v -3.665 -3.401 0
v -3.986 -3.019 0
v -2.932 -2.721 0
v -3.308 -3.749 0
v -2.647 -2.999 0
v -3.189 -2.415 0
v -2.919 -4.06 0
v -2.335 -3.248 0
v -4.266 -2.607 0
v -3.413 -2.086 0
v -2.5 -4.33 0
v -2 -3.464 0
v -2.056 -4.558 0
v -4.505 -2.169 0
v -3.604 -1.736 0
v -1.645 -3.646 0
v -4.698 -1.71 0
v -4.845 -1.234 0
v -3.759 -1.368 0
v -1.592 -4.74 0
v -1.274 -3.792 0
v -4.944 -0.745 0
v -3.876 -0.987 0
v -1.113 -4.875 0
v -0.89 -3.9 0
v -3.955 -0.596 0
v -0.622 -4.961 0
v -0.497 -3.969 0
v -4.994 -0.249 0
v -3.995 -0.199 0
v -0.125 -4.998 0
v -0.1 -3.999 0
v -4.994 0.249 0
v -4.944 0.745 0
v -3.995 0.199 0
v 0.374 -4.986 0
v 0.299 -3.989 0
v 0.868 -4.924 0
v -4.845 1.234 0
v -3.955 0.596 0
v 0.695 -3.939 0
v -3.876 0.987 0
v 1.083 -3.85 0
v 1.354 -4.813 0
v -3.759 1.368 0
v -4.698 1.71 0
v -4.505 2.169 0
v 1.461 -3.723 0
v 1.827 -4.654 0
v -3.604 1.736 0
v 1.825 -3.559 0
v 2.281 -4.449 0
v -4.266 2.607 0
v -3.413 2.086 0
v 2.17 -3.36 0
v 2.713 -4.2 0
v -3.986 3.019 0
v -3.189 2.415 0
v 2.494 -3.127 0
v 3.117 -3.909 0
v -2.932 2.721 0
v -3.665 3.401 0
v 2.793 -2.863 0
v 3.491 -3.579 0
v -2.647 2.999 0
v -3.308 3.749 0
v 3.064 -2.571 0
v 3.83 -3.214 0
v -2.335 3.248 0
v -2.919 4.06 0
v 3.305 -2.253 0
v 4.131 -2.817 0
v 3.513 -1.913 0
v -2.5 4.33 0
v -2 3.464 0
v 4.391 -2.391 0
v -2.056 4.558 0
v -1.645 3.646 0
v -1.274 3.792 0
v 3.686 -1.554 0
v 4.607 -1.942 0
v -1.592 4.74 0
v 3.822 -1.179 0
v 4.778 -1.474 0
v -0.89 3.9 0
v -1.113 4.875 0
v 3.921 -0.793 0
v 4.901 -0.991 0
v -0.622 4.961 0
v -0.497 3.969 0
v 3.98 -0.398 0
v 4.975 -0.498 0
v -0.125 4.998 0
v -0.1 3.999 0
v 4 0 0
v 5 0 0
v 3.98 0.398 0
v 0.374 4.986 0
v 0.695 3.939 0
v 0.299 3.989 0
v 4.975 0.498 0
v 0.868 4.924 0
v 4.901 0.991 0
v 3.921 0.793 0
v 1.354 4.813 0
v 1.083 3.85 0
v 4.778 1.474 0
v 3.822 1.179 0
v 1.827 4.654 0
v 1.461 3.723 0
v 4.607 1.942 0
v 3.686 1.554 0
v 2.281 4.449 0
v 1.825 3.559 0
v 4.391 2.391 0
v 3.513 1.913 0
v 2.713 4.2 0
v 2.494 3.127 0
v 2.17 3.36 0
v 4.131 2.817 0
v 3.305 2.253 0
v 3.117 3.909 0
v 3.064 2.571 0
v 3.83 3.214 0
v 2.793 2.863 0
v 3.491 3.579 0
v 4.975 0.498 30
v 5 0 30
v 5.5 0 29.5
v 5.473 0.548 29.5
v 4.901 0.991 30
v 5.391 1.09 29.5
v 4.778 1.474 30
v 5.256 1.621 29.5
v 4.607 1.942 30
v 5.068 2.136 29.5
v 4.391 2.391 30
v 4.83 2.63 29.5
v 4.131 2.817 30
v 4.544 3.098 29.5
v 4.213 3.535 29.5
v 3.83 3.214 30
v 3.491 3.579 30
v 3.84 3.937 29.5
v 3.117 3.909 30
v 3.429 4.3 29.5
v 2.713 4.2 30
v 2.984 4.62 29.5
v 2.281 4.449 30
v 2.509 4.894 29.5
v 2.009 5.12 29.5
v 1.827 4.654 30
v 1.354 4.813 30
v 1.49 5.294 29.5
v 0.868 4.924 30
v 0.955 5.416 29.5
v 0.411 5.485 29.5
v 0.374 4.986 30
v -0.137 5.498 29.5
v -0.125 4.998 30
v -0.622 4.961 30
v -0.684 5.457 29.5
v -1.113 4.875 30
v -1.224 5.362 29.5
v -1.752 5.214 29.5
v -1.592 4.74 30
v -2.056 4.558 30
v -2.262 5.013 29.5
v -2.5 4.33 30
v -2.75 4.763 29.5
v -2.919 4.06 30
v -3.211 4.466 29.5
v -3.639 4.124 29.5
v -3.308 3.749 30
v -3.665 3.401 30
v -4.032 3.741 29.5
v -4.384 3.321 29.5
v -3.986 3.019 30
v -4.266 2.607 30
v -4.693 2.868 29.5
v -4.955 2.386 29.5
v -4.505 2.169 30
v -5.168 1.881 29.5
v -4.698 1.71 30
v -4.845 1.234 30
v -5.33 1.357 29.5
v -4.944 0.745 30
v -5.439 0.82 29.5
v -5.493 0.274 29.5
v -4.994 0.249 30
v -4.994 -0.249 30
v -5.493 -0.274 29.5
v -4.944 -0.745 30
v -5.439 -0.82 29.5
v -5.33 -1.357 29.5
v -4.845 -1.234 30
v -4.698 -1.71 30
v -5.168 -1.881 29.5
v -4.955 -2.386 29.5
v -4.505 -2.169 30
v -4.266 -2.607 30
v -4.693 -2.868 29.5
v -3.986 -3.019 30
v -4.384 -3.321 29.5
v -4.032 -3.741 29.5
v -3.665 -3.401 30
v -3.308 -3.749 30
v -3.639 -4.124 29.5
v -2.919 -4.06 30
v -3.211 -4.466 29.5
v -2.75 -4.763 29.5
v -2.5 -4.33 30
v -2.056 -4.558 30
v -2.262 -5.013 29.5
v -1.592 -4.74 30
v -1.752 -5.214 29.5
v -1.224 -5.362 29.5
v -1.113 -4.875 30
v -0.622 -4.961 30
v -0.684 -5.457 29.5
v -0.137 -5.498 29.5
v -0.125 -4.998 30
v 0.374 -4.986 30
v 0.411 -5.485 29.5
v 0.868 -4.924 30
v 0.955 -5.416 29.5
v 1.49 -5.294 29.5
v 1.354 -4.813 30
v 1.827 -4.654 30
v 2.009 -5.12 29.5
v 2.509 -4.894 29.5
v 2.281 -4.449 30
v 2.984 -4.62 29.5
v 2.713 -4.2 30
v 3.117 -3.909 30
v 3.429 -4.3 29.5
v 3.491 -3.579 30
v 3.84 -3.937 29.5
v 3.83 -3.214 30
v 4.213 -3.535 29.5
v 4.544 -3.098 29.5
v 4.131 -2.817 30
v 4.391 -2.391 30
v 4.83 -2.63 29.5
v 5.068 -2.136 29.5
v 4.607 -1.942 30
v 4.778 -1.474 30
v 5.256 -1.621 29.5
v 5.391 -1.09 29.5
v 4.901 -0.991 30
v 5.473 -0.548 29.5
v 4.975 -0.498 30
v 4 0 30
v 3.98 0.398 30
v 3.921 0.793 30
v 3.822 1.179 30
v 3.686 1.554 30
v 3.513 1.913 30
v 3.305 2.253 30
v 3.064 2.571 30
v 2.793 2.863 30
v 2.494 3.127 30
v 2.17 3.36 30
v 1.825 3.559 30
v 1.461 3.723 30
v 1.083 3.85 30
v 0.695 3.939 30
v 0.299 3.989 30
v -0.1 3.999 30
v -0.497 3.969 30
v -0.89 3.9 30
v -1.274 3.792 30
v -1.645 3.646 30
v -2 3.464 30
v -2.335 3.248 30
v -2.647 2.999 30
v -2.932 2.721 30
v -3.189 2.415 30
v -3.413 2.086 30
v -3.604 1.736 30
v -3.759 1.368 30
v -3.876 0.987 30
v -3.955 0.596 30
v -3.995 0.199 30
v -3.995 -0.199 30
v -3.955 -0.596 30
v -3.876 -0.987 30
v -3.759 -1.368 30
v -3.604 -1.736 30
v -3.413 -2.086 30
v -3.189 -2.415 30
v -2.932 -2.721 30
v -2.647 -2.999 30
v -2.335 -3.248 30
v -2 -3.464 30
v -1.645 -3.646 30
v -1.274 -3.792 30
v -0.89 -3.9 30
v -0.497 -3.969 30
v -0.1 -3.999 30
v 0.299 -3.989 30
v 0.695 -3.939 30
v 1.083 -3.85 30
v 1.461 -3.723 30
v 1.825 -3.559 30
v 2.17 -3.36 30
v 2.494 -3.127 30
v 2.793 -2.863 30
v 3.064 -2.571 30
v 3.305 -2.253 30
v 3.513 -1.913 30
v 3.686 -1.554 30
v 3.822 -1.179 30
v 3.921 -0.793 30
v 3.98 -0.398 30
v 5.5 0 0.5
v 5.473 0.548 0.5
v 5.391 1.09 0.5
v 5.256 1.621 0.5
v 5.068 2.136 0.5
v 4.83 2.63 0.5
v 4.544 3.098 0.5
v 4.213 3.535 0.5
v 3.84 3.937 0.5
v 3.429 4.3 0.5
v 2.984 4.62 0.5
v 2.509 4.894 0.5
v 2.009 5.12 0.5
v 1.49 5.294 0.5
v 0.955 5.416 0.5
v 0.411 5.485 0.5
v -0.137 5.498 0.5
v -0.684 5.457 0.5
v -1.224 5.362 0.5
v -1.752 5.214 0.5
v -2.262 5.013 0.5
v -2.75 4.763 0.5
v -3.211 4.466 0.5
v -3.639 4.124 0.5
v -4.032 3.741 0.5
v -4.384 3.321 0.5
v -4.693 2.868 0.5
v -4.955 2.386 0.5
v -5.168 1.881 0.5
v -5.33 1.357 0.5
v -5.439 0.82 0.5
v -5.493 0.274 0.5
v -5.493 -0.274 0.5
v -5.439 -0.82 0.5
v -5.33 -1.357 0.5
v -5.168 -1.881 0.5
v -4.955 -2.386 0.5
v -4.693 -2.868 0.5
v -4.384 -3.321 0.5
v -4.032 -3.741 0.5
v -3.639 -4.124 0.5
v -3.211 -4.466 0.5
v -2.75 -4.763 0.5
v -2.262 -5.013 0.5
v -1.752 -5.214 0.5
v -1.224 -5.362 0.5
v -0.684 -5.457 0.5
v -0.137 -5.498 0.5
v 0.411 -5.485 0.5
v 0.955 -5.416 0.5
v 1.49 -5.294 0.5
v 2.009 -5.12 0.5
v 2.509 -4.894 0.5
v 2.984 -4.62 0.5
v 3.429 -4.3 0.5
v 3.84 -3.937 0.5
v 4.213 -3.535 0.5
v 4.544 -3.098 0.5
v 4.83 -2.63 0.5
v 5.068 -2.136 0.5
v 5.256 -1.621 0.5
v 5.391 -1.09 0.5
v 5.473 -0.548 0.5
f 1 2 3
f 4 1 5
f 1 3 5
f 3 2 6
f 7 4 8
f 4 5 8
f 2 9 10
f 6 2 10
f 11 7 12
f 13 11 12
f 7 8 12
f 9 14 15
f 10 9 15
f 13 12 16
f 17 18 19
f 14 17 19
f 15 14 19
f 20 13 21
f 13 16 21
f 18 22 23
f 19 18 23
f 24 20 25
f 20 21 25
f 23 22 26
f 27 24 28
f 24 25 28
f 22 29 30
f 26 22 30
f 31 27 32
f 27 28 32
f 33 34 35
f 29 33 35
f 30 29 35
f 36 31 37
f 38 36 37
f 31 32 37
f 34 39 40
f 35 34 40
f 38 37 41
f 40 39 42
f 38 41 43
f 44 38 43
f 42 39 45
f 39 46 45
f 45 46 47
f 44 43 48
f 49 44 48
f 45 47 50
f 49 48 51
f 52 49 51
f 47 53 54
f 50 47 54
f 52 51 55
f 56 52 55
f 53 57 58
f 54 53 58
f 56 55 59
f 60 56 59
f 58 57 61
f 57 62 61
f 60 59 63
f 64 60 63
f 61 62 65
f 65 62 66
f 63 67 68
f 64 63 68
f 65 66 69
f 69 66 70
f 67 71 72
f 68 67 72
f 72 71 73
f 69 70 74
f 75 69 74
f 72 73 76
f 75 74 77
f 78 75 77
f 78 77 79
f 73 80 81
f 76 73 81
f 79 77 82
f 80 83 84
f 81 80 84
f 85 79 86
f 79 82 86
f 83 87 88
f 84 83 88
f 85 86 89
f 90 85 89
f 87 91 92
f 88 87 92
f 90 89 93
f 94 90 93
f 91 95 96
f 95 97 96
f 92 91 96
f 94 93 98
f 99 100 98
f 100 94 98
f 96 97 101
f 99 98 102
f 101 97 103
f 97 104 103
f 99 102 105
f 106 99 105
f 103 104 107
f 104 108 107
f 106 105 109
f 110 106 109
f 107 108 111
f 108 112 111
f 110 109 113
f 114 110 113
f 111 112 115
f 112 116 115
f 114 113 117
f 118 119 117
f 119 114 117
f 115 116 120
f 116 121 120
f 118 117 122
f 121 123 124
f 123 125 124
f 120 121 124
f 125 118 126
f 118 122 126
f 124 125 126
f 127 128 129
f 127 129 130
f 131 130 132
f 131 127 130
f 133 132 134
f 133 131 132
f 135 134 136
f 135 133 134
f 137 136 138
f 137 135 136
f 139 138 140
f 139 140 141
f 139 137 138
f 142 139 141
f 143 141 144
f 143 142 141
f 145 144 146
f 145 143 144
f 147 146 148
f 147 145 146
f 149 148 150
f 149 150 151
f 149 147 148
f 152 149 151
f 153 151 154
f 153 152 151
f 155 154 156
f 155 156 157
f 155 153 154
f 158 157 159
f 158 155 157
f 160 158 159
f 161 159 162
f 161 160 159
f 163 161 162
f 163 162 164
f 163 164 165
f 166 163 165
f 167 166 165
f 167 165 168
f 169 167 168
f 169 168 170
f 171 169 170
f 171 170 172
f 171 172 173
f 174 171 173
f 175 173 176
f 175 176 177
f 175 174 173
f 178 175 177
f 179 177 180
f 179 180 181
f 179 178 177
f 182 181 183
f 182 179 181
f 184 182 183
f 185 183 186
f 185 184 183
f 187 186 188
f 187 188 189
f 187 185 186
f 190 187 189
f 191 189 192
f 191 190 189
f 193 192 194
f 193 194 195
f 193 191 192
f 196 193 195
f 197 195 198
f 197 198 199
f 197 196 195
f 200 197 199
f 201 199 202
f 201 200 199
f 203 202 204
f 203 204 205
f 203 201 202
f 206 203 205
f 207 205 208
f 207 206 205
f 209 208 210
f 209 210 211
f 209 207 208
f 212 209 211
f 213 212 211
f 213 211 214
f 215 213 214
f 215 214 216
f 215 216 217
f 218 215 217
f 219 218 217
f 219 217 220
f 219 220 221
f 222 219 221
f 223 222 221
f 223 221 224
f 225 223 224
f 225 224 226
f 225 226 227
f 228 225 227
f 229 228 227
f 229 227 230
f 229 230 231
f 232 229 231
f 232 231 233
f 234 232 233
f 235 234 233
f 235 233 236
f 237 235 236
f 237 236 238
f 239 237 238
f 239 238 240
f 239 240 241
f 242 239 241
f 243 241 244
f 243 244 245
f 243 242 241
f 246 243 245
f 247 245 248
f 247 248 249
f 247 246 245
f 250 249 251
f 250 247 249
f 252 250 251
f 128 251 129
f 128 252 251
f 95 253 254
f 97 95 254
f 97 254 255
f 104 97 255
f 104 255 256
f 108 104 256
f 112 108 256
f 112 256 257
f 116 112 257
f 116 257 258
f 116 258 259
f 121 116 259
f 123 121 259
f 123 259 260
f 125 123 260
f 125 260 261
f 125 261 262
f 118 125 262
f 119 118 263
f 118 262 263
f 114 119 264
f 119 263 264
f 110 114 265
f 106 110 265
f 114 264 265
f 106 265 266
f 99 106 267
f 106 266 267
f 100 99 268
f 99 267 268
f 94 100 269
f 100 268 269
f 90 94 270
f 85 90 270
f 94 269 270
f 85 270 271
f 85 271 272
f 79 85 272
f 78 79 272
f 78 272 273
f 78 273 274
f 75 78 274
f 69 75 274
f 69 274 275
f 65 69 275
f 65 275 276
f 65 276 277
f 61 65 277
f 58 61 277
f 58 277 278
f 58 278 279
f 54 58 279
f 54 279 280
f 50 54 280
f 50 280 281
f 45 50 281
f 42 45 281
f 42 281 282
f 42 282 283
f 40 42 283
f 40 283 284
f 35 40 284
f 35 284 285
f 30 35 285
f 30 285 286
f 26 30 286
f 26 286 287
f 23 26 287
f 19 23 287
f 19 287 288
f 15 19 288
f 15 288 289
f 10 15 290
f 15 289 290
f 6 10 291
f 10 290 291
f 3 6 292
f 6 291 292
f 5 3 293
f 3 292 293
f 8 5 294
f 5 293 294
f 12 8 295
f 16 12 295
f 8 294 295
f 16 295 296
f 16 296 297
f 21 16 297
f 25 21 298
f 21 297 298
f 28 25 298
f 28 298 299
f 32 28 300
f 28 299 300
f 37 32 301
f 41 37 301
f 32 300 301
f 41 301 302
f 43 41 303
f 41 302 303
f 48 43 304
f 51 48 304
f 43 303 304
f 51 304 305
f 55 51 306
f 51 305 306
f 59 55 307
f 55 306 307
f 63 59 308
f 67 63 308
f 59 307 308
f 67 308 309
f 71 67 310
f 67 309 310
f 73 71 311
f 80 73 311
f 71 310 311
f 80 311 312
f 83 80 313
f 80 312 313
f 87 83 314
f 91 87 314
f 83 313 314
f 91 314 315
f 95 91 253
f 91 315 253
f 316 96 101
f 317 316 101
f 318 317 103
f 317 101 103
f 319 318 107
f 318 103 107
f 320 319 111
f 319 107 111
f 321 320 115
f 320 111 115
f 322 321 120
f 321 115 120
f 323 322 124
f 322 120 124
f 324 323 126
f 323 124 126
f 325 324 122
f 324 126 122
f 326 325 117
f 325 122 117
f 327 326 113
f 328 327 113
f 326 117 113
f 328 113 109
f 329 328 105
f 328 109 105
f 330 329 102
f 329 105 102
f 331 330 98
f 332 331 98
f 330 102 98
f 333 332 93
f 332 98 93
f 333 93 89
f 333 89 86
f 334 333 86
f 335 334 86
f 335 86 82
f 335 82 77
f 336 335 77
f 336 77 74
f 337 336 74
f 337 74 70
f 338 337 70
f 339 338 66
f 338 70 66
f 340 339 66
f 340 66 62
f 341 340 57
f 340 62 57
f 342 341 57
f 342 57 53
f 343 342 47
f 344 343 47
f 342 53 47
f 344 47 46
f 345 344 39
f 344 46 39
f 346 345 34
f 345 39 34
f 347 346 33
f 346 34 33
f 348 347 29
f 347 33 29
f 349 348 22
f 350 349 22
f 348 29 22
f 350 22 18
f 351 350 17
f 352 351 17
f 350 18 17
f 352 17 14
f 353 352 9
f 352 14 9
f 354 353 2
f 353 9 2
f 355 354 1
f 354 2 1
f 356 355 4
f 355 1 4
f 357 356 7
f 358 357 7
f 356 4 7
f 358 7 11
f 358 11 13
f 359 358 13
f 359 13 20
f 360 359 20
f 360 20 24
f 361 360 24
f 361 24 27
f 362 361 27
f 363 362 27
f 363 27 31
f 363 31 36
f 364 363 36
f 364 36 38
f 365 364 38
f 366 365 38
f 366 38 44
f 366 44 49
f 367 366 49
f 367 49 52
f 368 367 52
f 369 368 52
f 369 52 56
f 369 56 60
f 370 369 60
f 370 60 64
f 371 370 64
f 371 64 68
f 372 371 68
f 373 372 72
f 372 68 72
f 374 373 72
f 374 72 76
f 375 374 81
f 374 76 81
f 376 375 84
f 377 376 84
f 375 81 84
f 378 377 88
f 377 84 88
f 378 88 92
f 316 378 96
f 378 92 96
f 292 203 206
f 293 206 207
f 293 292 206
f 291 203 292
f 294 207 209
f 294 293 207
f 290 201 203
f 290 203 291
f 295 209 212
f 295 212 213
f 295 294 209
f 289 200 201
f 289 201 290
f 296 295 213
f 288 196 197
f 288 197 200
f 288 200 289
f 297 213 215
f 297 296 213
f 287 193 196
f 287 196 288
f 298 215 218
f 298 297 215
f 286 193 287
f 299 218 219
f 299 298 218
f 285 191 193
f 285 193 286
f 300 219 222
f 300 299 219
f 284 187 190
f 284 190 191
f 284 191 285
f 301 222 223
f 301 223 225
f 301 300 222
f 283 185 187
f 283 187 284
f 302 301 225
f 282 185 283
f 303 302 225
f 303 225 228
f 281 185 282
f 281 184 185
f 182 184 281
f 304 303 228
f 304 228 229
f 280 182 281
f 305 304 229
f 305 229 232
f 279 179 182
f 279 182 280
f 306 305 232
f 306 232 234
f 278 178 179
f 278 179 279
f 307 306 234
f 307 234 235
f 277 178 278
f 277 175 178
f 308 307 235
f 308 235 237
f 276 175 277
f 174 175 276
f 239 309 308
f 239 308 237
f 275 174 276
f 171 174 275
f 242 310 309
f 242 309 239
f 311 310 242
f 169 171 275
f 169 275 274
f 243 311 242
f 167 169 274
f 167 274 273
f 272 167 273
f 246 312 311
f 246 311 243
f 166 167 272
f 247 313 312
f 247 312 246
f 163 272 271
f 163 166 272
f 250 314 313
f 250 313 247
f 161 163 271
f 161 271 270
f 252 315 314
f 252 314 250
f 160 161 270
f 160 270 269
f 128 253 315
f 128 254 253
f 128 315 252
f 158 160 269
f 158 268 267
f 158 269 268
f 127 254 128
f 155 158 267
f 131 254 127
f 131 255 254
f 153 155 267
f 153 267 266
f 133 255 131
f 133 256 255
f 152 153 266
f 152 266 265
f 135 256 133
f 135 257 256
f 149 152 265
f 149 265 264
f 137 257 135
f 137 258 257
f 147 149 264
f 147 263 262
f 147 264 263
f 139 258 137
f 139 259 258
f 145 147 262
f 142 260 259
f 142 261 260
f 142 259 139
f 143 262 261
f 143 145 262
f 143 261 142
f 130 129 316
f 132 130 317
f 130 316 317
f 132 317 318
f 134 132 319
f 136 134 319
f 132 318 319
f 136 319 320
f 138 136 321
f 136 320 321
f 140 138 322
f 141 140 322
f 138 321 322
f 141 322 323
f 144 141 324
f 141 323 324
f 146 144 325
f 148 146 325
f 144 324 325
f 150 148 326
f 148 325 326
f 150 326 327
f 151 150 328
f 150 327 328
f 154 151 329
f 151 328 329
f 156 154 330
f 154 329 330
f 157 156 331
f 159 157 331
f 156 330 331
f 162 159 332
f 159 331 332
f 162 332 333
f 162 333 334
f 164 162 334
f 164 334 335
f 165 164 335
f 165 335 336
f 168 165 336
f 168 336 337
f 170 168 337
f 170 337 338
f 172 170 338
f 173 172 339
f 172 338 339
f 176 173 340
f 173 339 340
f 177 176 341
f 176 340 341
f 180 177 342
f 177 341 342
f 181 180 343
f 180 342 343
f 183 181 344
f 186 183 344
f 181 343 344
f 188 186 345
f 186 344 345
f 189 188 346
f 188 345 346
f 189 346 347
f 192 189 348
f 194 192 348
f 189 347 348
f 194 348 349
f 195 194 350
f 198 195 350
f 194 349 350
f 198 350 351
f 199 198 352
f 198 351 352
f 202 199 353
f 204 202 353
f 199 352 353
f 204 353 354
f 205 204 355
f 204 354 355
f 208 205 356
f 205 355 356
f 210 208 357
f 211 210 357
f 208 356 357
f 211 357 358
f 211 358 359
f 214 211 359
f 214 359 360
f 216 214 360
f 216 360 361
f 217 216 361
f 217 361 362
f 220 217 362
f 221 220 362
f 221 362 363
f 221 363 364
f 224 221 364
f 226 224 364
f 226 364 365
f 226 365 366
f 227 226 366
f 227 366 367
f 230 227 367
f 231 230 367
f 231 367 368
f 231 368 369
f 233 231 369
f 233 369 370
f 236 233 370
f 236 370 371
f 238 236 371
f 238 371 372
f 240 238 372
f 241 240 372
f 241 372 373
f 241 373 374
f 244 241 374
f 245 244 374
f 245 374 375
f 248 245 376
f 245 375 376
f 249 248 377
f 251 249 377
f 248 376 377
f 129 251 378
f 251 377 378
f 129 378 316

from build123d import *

# Parameters (mm, degrees)
SCHIZZO1_R                   = 5.5
ESTRUSIONE_ESTRUSIONE1_DEPTH = 30
SCHIZZO2_R                   = 4
TAGLIO_ESTRUSIONE1_DEPTH     = 31
SMUSSO1_SIZE                 = 0.5


with BuildPart() as part:
    # Schizzo1 → Estrusione-Estrusione1 (new body)
    with BuildSketch(Plane.XY):
        Circle(SCHIZZO1_R)
    extrude(amount=ESTRUSIONE_ESTRUSIONE1_DEPTH)

    # Schizzo2 → Taglio-Estrusione1 (cut, through all)
    with BuildSketch(Plane.XY.offset(30)):
        Circle(SCHIZZO2_R)
    extrude(amount=-TAGLIO_ESTRUSIONE1_DEPTH, mode=Mode.SUBTRACT)

    # Smusso1
    smusso1_edges = [part.edges().sort_by_distance(p)[0] for p in [
        (-5.5, 0, 0),
        (-5.5, 0, 30),
    ]]
    chamfer(smusso1_edges, length=SMUSSO1_SIZE)


solid = part.part
